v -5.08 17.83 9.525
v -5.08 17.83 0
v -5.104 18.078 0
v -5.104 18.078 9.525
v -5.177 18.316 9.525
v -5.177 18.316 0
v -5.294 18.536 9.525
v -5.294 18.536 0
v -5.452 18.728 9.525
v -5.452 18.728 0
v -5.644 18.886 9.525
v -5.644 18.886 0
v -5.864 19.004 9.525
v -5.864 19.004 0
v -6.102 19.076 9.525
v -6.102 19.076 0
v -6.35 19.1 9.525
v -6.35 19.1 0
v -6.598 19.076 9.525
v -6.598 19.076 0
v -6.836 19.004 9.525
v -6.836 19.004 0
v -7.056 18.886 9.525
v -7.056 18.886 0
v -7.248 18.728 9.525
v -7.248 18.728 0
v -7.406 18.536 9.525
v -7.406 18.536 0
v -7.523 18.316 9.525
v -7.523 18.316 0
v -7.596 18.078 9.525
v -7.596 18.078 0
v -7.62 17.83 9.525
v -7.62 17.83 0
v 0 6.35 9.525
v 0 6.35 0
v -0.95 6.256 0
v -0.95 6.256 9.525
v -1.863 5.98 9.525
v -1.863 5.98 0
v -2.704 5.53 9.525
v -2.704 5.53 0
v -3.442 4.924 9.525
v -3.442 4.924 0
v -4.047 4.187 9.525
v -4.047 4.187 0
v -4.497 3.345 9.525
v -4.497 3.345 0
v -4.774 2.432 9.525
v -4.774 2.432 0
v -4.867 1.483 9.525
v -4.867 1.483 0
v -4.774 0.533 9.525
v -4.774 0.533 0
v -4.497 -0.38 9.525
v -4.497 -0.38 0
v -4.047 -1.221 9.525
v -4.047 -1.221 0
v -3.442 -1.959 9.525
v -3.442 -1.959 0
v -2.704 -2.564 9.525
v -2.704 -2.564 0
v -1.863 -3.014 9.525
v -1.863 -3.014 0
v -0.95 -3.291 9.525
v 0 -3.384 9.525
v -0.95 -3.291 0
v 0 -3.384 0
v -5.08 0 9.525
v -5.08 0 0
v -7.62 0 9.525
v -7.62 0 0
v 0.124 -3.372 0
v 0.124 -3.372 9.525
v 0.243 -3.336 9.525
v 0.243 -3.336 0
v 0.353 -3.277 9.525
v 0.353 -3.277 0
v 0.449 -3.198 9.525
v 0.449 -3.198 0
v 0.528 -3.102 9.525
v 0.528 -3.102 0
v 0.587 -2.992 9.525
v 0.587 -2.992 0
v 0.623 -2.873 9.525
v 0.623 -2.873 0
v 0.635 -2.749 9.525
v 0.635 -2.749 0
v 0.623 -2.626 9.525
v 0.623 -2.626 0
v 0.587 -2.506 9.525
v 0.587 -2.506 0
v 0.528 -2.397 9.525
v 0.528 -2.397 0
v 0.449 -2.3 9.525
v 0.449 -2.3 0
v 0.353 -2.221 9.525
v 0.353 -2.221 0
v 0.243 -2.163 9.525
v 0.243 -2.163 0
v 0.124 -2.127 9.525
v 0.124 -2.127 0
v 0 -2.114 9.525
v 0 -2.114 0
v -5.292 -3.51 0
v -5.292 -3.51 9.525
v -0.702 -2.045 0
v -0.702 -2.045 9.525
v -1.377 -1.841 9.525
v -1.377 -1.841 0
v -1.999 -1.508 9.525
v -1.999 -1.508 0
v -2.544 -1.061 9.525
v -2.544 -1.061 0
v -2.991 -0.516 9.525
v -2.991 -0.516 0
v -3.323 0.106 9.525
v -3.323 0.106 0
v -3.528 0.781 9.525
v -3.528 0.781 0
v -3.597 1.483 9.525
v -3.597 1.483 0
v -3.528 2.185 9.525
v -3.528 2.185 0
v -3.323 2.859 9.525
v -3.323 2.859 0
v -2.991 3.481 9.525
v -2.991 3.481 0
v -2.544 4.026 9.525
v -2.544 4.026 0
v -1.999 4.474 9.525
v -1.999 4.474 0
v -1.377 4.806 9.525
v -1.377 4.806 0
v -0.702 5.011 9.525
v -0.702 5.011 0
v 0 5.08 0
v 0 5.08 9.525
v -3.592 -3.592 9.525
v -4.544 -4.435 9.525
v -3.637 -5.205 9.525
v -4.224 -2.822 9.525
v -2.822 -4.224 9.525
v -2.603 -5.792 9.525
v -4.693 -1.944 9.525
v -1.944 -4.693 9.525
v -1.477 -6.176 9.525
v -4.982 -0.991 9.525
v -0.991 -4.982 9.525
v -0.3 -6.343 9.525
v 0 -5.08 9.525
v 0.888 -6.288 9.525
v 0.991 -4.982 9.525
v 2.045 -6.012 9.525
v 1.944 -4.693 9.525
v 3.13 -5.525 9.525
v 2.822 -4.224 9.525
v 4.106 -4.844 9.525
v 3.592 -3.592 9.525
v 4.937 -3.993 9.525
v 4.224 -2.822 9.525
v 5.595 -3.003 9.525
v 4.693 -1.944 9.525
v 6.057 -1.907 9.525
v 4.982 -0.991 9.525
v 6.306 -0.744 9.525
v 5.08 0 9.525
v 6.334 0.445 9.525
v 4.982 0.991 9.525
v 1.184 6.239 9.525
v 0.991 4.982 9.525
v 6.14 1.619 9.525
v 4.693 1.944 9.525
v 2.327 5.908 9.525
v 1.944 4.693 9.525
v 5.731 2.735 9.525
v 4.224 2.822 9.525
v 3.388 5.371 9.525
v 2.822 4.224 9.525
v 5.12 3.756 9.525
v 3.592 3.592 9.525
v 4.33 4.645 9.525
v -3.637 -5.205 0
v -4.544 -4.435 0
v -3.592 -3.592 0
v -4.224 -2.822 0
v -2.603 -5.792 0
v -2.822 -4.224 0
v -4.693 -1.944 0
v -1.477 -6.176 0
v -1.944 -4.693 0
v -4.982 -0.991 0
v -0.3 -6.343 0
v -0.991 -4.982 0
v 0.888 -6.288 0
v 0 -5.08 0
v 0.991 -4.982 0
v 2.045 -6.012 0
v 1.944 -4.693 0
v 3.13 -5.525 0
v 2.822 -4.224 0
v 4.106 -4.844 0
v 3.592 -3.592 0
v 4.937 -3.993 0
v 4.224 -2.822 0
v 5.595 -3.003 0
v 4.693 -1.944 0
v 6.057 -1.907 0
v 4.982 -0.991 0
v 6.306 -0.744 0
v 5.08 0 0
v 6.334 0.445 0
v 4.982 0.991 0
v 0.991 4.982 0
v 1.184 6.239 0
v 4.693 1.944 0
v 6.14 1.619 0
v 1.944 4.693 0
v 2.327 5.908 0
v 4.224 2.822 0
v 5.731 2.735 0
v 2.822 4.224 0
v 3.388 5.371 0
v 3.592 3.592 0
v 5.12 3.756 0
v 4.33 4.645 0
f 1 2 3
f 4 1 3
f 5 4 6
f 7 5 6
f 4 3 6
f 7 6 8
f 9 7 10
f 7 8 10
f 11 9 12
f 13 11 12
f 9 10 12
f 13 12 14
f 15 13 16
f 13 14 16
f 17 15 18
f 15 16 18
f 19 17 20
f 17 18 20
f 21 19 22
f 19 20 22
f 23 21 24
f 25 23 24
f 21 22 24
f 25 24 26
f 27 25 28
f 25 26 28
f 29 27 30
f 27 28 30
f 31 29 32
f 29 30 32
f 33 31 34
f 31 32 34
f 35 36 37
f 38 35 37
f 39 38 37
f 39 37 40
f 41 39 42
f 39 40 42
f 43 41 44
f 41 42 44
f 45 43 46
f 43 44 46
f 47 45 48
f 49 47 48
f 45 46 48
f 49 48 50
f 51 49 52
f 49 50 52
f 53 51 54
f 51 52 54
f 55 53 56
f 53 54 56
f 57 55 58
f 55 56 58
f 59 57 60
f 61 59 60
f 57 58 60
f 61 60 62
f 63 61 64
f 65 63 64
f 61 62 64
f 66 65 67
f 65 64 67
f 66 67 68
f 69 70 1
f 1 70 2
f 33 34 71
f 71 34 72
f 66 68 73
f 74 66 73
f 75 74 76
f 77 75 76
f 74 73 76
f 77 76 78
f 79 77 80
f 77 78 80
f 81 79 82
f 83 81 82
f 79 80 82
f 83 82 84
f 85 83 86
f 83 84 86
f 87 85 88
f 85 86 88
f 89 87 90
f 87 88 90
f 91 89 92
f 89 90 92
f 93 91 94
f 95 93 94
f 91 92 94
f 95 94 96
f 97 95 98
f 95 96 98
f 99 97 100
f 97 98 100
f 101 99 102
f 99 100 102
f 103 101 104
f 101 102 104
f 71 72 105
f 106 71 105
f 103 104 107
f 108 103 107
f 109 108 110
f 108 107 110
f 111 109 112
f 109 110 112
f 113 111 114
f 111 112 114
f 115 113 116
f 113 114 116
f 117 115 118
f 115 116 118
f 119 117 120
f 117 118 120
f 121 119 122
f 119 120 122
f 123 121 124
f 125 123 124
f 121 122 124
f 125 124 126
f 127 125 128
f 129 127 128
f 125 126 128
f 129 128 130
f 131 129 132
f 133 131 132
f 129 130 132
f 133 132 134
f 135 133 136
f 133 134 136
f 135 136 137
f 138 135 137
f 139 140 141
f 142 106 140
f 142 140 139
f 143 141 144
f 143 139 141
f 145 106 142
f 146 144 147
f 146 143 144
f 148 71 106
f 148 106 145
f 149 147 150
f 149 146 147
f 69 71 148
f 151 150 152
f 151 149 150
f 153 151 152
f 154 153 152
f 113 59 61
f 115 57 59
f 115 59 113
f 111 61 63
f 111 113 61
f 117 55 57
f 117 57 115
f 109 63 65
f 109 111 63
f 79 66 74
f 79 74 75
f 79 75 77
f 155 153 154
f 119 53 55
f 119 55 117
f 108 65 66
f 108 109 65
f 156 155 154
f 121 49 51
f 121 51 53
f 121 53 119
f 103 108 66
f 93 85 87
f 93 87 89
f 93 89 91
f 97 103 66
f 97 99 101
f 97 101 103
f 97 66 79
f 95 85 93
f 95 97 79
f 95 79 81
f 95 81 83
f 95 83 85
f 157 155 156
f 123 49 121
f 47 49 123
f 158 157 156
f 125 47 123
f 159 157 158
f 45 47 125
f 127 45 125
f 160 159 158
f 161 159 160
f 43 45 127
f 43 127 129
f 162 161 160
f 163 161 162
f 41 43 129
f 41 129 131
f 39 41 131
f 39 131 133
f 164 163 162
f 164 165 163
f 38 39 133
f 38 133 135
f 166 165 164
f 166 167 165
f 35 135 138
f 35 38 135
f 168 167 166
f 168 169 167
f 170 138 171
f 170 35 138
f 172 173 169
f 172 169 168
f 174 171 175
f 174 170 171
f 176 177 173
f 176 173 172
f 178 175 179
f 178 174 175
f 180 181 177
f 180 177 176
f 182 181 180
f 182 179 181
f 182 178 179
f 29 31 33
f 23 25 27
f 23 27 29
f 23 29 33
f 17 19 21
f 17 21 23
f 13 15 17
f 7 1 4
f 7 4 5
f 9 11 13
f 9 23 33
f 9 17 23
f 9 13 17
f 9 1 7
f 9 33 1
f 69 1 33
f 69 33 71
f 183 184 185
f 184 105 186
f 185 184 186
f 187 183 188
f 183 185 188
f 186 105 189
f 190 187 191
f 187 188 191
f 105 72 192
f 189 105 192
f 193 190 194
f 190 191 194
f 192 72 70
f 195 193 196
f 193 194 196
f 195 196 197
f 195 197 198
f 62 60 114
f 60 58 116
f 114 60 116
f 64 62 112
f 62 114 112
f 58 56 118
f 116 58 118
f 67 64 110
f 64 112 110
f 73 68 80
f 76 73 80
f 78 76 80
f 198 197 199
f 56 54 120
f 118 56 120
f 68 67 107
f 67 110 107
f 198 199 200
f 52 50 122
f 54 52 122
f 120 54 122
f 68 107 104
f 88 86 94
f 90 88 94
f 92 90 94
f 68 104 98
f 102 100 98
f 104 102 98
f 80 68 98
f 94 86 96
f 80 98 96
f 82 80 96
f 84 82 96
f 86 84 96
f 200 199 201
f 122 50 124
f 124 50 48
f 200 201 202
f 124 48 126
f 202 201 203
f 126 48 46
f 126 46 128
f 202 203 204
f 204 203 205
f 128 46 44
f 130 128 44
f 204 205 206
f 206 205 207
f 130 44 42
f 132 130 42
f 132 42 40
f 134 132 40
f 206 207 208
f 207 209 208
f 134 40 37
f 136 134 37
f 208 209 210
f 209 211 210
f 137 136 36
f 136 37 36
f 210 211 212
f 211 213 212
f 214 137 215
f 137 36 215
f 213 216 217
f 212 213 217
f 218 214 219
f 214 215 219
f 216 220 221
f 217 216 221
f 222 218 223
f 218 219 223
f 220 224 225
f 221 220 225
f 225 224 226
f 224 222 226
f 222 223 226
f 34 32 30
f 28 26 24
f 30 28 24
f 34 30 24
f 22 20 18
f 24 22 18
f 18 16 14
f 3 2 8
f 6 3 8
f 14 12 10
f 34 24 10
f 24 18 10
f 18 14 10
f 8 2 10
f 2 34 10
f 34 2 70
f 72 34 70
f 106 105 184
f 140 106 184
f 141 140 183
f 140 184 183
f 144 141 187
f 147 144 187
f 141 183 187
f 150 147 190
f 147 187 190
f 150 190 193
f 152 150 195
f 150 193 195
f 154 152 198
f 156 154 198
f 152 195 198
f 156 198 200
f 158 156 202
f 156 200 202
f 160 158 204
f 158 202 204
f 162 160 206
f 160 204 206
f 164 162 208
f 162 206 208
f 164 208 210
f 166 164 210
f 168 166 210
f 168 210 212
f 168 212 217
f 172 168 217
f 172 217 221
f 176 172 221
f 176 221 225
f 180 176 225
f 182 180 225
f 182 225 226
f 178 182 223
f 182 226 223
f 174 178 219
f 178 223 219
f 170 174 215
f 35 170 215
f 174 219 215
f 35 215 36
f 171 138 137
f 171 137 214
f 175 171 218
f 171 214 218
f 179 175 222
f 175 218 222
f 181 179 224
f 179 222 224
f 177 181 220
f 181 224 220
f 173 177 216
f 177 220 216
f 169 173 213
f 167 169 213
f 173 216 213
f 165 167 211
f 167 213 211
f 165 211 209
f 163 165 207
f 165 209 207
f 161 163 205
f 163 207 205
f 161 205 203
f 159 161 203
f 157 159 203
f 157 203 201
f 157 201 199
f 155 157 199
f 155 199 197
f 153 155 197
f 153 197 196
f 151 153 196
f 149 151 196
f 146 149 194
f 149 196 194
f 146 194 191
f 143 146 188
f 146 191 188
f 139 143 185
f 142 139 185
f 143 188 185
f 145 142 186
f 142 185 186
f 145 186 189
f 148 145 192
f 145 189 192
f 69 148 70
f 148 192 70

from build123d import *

# Parameters (mm, degrees)
F1_DEPTH = 9.525


with BuildPart() as f1:
    # F0 (on Top) → F1 (new body)
    with BuildSketch(Plane.XY):
        with BuildLine():
            Line((-7.62, 0), (-5.291667, -3.510095))
            ThreePointArc((-5.291667, -3.510095), (5.595159, -3.002782), (0, 6.35))
            ThreePointArc((0, 6.35), (-4.86723, 1.48277), (0, -3.384459))
            ThreePointArc((0, -3.384459), (0.635, -2.749459), (0, -2.114459))
            ThreePointArc((0, -2.114459), (-3.59723, 1.48277), (0, 5.08))
            ThreePointArc((0, 5.08), (3.592102, -3.592102), (-5.08, 0))
            Line((-5.08, 0), (-5.08, 17.830187))
            ThreePointArc((-5.08, 17.830187), (-6.35, 19.100187), (-7.62, 17.830187))
            Line((-7.62, 17.830187), (-7.62, 0))
        make_face()
    extrude(amount=F1_DEPTH)


solid = f1.part
